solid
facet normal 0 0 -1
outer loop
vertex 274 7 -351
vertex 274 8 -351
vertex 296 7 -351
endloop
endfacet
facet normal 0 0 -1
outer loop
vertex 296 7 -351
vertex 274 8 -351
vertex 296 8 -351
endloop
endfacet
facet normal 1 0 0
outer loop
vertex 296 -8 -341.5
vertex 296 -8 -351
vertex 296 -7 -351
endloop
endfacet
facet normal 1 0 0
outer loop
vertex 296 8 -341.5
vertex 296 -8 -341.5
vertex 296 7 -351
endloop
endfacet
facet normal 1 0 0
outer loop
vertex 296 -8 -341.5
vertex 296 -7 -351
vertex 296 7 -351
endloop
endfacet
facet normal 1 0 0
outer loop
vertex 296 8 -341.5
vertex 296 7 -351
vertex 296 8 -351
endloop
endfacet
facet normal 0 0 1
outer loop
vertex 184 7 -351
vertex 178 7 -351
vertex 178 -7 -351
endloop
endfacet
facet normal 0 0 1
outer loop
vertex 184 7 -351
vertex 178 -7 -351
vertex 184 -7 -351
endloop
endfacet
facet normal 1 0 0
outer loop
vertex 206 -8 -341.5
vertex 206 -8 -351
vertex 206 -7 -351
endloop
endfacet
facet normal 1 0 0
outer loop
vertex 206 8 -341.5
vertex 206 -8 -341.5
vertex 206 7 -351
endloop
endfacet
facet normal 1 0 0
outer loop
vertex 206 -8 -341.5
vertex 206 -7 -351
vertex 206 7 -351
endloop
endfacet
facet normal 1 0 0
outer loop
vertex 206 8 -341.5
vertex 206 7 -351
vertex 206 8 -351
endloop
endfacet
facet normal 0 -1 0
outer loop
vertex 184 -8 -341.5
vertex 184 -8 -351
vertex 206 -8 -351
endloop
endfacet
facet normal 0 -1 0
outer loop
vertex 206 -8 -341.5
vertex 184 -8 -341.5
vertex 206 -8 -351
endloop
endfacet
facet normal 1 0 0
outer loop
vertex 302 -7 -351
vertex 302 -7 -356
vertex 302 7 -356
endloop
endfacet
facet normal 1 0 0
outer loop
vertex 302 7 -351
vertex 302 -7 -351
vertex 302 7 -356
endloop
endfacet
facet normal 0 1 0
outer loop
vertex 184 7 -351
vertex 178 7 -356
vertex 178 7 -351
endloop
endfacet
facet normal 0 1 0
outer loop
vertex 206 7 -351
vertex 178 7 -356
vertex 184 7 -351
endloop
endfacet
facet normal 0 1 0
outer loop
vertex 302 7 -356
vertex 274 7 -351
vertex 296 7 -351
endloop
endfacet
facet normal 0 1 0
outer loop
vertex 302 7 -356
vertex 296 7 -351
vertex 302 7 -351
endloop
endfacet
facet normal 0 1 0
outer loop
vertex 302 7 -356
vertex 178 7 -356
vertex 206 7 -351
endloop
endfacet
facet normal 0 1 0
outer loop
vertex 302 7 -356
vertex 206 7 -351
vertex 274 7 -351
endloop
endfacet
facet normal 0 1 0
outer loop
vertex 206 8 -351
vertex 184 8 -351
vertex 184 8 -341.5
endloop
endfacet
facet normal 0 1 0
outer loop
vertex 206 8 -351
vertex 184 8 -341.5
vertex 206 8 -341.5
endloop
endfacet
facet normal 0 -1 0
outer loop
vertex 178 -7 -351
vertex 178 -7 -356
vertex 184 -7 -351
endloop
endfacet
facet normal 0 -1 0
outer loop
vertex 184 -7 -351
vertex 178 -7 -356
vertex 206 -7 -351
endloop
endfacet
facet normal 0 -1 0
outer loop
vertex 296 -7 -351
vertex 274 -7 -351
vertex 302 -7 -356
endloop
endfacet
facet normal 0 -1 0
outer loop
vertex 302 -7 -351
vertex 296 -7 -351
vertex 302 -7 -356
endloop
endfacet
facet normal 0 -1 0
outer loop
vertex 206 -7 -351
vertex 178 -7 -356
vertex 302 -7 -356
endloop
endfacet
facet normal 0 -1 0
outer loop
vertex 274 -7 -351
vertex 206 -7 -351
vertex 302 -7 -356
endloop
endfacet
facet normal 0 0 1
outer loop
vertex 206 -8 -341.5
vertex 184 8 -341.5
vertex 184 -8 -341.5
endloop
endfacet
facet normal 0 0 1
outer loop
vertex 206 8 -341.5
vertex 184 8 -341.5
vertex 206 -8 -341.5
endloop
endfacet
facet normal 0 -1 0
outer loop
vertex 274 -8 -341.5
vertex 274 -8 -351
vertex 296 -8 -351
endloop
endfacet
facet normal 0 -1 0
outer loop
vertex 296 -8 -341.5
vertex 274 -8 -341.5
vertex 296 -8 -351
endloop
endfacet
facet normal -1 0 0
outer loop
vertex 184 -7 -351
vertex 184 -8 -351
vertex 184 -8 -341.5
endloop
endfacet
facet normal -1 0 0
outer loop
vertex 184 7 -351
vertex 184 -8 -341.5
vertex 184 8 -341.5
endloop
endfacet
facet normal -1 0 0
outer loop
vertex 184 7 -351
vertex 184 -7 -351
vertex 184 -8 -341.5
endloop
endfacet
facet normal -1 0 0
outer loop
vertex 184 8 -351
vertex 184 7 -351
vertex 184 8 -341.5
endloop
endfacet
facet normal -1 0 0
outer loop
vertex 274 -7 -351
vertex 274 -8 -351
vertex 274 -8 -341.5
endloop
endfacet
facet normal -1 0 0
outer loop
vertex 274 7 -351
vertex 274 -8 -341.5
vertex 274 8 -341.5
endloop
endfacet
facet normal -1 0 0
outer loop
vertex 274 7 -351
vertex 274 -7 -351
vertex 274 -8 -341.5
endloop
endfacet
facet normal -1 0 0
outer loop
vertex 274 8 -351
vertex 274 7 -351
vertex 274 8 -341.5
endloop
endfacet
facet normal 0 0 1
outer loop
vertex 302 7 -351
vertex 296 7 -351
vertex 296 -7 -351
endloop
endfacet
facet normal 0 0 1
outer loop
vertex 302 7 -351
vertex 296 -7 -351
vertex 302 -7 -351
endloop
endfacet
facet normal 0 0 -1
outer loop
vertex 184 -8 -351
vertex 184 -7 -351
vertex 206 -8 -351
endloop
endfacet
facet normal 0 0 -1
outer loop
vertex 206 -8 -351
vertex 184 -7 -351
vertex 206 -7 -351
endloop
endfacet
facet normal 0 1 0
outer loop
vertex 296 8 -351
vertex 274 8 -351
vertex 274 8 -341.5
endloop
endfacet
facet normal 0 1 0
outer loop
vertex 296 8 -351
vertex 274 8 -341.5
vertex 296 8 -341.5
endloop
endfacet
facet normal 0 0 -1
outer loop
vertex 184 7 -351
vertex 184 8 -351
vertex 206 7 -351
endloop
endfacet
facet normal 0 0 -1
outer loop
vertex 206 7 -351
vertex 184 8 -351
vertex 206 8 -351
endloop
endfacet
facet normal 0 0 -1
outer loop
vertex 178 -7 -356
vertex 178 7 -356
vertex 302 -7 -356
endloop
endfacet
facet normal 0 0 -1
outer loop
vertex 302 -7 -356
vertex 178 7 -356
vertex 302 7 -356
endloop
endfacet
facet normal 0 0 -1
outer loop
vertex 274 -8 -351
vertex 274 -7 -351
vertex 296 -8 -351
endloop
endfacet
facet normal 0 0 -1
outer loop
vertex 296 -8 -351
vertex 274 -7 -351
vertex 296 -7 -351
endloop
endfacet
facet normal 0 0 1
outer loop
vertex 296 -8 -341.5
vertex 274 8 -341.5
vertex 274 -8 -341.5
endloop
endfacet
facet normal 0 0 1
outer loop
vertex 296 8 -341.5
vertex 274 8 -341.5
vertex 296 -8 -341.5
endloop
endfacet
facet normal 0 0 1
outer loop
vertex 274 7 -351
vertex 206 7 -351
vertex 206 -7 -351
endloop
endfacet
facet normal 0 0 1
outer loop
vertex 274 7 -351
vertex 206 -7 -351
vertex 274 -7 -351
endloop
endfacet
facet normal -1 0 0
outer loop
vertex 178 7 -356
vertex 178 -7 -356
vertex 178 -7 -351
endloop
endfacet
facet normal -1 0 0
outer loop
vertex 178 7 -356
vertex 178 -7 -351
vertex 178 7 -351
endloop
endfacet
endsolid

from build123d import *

# Parameters (mm, degrees)
EXTRUDE_START      = -356
EXTRUDE_SKETCH_1_W = 124
EXTRUDE_SKETCH_1_H = 14
EXTRUDE_1_DEPTH    = 5
EXTRUDE_START_2    = -351
EXTRUDE_SKETCH_2_W = 22
EXTRUDE_SKETCH_2_H = 16
EXTRUDE_2_DEPTH    = 9.5
EXTRUDE_SKETCH_3_W = 22
EXTRUDE_SKETCH_3_H = 16
EXTRUDE_3_DEPTH    = 9.5


with BuildPart() as part:
    # Extrude sketch 1 → Extrude 1 (new body)
    with BuildSketch(Plane.XY.offset(EXTRUDE_START)):
        with Locations((240, 0)):
            Rectangle(EXTRUDE_SKETCH_1_W, EXTRUDE_SKETCH_1_H)
    extrude(amount=EXTRUDE_1_DEPTH)


with BuildPart() as body_2:
    # Extrude sketch 2 → Extrude 2 (new body)
    with BuildSketch(Plane.XY.offset(EXTRUDE_START_2)):
        with Locations((285, 0)):
            Rectangle(EXTRUDE_SKETCH_2_W, EXTRUDE_SKETCH_2_H)
    extrude(amount=EXTRUDE_2_DEPTH)


with BuildPart() as body_3:
    # Extrude sketch 3 → Extrude 3 (new body)
    with BuildSketch(Plane.XY.offset(EXTRUDE_START_2)):
        with Locations((195, 0)):
            Rectangle(EXTRUDE_SKETCH_3_W, EXTRUDE_SKETCH_3_H)
    extrude(amount=EXTRUDE_3_DEPTH)


with BuildPart() as part_1:
    add(part.part)

    # Combine (weld / assembly of features): union body 2, body 3
    add(body_2.part)
    add(body_3.part)


solid = part_1.part
